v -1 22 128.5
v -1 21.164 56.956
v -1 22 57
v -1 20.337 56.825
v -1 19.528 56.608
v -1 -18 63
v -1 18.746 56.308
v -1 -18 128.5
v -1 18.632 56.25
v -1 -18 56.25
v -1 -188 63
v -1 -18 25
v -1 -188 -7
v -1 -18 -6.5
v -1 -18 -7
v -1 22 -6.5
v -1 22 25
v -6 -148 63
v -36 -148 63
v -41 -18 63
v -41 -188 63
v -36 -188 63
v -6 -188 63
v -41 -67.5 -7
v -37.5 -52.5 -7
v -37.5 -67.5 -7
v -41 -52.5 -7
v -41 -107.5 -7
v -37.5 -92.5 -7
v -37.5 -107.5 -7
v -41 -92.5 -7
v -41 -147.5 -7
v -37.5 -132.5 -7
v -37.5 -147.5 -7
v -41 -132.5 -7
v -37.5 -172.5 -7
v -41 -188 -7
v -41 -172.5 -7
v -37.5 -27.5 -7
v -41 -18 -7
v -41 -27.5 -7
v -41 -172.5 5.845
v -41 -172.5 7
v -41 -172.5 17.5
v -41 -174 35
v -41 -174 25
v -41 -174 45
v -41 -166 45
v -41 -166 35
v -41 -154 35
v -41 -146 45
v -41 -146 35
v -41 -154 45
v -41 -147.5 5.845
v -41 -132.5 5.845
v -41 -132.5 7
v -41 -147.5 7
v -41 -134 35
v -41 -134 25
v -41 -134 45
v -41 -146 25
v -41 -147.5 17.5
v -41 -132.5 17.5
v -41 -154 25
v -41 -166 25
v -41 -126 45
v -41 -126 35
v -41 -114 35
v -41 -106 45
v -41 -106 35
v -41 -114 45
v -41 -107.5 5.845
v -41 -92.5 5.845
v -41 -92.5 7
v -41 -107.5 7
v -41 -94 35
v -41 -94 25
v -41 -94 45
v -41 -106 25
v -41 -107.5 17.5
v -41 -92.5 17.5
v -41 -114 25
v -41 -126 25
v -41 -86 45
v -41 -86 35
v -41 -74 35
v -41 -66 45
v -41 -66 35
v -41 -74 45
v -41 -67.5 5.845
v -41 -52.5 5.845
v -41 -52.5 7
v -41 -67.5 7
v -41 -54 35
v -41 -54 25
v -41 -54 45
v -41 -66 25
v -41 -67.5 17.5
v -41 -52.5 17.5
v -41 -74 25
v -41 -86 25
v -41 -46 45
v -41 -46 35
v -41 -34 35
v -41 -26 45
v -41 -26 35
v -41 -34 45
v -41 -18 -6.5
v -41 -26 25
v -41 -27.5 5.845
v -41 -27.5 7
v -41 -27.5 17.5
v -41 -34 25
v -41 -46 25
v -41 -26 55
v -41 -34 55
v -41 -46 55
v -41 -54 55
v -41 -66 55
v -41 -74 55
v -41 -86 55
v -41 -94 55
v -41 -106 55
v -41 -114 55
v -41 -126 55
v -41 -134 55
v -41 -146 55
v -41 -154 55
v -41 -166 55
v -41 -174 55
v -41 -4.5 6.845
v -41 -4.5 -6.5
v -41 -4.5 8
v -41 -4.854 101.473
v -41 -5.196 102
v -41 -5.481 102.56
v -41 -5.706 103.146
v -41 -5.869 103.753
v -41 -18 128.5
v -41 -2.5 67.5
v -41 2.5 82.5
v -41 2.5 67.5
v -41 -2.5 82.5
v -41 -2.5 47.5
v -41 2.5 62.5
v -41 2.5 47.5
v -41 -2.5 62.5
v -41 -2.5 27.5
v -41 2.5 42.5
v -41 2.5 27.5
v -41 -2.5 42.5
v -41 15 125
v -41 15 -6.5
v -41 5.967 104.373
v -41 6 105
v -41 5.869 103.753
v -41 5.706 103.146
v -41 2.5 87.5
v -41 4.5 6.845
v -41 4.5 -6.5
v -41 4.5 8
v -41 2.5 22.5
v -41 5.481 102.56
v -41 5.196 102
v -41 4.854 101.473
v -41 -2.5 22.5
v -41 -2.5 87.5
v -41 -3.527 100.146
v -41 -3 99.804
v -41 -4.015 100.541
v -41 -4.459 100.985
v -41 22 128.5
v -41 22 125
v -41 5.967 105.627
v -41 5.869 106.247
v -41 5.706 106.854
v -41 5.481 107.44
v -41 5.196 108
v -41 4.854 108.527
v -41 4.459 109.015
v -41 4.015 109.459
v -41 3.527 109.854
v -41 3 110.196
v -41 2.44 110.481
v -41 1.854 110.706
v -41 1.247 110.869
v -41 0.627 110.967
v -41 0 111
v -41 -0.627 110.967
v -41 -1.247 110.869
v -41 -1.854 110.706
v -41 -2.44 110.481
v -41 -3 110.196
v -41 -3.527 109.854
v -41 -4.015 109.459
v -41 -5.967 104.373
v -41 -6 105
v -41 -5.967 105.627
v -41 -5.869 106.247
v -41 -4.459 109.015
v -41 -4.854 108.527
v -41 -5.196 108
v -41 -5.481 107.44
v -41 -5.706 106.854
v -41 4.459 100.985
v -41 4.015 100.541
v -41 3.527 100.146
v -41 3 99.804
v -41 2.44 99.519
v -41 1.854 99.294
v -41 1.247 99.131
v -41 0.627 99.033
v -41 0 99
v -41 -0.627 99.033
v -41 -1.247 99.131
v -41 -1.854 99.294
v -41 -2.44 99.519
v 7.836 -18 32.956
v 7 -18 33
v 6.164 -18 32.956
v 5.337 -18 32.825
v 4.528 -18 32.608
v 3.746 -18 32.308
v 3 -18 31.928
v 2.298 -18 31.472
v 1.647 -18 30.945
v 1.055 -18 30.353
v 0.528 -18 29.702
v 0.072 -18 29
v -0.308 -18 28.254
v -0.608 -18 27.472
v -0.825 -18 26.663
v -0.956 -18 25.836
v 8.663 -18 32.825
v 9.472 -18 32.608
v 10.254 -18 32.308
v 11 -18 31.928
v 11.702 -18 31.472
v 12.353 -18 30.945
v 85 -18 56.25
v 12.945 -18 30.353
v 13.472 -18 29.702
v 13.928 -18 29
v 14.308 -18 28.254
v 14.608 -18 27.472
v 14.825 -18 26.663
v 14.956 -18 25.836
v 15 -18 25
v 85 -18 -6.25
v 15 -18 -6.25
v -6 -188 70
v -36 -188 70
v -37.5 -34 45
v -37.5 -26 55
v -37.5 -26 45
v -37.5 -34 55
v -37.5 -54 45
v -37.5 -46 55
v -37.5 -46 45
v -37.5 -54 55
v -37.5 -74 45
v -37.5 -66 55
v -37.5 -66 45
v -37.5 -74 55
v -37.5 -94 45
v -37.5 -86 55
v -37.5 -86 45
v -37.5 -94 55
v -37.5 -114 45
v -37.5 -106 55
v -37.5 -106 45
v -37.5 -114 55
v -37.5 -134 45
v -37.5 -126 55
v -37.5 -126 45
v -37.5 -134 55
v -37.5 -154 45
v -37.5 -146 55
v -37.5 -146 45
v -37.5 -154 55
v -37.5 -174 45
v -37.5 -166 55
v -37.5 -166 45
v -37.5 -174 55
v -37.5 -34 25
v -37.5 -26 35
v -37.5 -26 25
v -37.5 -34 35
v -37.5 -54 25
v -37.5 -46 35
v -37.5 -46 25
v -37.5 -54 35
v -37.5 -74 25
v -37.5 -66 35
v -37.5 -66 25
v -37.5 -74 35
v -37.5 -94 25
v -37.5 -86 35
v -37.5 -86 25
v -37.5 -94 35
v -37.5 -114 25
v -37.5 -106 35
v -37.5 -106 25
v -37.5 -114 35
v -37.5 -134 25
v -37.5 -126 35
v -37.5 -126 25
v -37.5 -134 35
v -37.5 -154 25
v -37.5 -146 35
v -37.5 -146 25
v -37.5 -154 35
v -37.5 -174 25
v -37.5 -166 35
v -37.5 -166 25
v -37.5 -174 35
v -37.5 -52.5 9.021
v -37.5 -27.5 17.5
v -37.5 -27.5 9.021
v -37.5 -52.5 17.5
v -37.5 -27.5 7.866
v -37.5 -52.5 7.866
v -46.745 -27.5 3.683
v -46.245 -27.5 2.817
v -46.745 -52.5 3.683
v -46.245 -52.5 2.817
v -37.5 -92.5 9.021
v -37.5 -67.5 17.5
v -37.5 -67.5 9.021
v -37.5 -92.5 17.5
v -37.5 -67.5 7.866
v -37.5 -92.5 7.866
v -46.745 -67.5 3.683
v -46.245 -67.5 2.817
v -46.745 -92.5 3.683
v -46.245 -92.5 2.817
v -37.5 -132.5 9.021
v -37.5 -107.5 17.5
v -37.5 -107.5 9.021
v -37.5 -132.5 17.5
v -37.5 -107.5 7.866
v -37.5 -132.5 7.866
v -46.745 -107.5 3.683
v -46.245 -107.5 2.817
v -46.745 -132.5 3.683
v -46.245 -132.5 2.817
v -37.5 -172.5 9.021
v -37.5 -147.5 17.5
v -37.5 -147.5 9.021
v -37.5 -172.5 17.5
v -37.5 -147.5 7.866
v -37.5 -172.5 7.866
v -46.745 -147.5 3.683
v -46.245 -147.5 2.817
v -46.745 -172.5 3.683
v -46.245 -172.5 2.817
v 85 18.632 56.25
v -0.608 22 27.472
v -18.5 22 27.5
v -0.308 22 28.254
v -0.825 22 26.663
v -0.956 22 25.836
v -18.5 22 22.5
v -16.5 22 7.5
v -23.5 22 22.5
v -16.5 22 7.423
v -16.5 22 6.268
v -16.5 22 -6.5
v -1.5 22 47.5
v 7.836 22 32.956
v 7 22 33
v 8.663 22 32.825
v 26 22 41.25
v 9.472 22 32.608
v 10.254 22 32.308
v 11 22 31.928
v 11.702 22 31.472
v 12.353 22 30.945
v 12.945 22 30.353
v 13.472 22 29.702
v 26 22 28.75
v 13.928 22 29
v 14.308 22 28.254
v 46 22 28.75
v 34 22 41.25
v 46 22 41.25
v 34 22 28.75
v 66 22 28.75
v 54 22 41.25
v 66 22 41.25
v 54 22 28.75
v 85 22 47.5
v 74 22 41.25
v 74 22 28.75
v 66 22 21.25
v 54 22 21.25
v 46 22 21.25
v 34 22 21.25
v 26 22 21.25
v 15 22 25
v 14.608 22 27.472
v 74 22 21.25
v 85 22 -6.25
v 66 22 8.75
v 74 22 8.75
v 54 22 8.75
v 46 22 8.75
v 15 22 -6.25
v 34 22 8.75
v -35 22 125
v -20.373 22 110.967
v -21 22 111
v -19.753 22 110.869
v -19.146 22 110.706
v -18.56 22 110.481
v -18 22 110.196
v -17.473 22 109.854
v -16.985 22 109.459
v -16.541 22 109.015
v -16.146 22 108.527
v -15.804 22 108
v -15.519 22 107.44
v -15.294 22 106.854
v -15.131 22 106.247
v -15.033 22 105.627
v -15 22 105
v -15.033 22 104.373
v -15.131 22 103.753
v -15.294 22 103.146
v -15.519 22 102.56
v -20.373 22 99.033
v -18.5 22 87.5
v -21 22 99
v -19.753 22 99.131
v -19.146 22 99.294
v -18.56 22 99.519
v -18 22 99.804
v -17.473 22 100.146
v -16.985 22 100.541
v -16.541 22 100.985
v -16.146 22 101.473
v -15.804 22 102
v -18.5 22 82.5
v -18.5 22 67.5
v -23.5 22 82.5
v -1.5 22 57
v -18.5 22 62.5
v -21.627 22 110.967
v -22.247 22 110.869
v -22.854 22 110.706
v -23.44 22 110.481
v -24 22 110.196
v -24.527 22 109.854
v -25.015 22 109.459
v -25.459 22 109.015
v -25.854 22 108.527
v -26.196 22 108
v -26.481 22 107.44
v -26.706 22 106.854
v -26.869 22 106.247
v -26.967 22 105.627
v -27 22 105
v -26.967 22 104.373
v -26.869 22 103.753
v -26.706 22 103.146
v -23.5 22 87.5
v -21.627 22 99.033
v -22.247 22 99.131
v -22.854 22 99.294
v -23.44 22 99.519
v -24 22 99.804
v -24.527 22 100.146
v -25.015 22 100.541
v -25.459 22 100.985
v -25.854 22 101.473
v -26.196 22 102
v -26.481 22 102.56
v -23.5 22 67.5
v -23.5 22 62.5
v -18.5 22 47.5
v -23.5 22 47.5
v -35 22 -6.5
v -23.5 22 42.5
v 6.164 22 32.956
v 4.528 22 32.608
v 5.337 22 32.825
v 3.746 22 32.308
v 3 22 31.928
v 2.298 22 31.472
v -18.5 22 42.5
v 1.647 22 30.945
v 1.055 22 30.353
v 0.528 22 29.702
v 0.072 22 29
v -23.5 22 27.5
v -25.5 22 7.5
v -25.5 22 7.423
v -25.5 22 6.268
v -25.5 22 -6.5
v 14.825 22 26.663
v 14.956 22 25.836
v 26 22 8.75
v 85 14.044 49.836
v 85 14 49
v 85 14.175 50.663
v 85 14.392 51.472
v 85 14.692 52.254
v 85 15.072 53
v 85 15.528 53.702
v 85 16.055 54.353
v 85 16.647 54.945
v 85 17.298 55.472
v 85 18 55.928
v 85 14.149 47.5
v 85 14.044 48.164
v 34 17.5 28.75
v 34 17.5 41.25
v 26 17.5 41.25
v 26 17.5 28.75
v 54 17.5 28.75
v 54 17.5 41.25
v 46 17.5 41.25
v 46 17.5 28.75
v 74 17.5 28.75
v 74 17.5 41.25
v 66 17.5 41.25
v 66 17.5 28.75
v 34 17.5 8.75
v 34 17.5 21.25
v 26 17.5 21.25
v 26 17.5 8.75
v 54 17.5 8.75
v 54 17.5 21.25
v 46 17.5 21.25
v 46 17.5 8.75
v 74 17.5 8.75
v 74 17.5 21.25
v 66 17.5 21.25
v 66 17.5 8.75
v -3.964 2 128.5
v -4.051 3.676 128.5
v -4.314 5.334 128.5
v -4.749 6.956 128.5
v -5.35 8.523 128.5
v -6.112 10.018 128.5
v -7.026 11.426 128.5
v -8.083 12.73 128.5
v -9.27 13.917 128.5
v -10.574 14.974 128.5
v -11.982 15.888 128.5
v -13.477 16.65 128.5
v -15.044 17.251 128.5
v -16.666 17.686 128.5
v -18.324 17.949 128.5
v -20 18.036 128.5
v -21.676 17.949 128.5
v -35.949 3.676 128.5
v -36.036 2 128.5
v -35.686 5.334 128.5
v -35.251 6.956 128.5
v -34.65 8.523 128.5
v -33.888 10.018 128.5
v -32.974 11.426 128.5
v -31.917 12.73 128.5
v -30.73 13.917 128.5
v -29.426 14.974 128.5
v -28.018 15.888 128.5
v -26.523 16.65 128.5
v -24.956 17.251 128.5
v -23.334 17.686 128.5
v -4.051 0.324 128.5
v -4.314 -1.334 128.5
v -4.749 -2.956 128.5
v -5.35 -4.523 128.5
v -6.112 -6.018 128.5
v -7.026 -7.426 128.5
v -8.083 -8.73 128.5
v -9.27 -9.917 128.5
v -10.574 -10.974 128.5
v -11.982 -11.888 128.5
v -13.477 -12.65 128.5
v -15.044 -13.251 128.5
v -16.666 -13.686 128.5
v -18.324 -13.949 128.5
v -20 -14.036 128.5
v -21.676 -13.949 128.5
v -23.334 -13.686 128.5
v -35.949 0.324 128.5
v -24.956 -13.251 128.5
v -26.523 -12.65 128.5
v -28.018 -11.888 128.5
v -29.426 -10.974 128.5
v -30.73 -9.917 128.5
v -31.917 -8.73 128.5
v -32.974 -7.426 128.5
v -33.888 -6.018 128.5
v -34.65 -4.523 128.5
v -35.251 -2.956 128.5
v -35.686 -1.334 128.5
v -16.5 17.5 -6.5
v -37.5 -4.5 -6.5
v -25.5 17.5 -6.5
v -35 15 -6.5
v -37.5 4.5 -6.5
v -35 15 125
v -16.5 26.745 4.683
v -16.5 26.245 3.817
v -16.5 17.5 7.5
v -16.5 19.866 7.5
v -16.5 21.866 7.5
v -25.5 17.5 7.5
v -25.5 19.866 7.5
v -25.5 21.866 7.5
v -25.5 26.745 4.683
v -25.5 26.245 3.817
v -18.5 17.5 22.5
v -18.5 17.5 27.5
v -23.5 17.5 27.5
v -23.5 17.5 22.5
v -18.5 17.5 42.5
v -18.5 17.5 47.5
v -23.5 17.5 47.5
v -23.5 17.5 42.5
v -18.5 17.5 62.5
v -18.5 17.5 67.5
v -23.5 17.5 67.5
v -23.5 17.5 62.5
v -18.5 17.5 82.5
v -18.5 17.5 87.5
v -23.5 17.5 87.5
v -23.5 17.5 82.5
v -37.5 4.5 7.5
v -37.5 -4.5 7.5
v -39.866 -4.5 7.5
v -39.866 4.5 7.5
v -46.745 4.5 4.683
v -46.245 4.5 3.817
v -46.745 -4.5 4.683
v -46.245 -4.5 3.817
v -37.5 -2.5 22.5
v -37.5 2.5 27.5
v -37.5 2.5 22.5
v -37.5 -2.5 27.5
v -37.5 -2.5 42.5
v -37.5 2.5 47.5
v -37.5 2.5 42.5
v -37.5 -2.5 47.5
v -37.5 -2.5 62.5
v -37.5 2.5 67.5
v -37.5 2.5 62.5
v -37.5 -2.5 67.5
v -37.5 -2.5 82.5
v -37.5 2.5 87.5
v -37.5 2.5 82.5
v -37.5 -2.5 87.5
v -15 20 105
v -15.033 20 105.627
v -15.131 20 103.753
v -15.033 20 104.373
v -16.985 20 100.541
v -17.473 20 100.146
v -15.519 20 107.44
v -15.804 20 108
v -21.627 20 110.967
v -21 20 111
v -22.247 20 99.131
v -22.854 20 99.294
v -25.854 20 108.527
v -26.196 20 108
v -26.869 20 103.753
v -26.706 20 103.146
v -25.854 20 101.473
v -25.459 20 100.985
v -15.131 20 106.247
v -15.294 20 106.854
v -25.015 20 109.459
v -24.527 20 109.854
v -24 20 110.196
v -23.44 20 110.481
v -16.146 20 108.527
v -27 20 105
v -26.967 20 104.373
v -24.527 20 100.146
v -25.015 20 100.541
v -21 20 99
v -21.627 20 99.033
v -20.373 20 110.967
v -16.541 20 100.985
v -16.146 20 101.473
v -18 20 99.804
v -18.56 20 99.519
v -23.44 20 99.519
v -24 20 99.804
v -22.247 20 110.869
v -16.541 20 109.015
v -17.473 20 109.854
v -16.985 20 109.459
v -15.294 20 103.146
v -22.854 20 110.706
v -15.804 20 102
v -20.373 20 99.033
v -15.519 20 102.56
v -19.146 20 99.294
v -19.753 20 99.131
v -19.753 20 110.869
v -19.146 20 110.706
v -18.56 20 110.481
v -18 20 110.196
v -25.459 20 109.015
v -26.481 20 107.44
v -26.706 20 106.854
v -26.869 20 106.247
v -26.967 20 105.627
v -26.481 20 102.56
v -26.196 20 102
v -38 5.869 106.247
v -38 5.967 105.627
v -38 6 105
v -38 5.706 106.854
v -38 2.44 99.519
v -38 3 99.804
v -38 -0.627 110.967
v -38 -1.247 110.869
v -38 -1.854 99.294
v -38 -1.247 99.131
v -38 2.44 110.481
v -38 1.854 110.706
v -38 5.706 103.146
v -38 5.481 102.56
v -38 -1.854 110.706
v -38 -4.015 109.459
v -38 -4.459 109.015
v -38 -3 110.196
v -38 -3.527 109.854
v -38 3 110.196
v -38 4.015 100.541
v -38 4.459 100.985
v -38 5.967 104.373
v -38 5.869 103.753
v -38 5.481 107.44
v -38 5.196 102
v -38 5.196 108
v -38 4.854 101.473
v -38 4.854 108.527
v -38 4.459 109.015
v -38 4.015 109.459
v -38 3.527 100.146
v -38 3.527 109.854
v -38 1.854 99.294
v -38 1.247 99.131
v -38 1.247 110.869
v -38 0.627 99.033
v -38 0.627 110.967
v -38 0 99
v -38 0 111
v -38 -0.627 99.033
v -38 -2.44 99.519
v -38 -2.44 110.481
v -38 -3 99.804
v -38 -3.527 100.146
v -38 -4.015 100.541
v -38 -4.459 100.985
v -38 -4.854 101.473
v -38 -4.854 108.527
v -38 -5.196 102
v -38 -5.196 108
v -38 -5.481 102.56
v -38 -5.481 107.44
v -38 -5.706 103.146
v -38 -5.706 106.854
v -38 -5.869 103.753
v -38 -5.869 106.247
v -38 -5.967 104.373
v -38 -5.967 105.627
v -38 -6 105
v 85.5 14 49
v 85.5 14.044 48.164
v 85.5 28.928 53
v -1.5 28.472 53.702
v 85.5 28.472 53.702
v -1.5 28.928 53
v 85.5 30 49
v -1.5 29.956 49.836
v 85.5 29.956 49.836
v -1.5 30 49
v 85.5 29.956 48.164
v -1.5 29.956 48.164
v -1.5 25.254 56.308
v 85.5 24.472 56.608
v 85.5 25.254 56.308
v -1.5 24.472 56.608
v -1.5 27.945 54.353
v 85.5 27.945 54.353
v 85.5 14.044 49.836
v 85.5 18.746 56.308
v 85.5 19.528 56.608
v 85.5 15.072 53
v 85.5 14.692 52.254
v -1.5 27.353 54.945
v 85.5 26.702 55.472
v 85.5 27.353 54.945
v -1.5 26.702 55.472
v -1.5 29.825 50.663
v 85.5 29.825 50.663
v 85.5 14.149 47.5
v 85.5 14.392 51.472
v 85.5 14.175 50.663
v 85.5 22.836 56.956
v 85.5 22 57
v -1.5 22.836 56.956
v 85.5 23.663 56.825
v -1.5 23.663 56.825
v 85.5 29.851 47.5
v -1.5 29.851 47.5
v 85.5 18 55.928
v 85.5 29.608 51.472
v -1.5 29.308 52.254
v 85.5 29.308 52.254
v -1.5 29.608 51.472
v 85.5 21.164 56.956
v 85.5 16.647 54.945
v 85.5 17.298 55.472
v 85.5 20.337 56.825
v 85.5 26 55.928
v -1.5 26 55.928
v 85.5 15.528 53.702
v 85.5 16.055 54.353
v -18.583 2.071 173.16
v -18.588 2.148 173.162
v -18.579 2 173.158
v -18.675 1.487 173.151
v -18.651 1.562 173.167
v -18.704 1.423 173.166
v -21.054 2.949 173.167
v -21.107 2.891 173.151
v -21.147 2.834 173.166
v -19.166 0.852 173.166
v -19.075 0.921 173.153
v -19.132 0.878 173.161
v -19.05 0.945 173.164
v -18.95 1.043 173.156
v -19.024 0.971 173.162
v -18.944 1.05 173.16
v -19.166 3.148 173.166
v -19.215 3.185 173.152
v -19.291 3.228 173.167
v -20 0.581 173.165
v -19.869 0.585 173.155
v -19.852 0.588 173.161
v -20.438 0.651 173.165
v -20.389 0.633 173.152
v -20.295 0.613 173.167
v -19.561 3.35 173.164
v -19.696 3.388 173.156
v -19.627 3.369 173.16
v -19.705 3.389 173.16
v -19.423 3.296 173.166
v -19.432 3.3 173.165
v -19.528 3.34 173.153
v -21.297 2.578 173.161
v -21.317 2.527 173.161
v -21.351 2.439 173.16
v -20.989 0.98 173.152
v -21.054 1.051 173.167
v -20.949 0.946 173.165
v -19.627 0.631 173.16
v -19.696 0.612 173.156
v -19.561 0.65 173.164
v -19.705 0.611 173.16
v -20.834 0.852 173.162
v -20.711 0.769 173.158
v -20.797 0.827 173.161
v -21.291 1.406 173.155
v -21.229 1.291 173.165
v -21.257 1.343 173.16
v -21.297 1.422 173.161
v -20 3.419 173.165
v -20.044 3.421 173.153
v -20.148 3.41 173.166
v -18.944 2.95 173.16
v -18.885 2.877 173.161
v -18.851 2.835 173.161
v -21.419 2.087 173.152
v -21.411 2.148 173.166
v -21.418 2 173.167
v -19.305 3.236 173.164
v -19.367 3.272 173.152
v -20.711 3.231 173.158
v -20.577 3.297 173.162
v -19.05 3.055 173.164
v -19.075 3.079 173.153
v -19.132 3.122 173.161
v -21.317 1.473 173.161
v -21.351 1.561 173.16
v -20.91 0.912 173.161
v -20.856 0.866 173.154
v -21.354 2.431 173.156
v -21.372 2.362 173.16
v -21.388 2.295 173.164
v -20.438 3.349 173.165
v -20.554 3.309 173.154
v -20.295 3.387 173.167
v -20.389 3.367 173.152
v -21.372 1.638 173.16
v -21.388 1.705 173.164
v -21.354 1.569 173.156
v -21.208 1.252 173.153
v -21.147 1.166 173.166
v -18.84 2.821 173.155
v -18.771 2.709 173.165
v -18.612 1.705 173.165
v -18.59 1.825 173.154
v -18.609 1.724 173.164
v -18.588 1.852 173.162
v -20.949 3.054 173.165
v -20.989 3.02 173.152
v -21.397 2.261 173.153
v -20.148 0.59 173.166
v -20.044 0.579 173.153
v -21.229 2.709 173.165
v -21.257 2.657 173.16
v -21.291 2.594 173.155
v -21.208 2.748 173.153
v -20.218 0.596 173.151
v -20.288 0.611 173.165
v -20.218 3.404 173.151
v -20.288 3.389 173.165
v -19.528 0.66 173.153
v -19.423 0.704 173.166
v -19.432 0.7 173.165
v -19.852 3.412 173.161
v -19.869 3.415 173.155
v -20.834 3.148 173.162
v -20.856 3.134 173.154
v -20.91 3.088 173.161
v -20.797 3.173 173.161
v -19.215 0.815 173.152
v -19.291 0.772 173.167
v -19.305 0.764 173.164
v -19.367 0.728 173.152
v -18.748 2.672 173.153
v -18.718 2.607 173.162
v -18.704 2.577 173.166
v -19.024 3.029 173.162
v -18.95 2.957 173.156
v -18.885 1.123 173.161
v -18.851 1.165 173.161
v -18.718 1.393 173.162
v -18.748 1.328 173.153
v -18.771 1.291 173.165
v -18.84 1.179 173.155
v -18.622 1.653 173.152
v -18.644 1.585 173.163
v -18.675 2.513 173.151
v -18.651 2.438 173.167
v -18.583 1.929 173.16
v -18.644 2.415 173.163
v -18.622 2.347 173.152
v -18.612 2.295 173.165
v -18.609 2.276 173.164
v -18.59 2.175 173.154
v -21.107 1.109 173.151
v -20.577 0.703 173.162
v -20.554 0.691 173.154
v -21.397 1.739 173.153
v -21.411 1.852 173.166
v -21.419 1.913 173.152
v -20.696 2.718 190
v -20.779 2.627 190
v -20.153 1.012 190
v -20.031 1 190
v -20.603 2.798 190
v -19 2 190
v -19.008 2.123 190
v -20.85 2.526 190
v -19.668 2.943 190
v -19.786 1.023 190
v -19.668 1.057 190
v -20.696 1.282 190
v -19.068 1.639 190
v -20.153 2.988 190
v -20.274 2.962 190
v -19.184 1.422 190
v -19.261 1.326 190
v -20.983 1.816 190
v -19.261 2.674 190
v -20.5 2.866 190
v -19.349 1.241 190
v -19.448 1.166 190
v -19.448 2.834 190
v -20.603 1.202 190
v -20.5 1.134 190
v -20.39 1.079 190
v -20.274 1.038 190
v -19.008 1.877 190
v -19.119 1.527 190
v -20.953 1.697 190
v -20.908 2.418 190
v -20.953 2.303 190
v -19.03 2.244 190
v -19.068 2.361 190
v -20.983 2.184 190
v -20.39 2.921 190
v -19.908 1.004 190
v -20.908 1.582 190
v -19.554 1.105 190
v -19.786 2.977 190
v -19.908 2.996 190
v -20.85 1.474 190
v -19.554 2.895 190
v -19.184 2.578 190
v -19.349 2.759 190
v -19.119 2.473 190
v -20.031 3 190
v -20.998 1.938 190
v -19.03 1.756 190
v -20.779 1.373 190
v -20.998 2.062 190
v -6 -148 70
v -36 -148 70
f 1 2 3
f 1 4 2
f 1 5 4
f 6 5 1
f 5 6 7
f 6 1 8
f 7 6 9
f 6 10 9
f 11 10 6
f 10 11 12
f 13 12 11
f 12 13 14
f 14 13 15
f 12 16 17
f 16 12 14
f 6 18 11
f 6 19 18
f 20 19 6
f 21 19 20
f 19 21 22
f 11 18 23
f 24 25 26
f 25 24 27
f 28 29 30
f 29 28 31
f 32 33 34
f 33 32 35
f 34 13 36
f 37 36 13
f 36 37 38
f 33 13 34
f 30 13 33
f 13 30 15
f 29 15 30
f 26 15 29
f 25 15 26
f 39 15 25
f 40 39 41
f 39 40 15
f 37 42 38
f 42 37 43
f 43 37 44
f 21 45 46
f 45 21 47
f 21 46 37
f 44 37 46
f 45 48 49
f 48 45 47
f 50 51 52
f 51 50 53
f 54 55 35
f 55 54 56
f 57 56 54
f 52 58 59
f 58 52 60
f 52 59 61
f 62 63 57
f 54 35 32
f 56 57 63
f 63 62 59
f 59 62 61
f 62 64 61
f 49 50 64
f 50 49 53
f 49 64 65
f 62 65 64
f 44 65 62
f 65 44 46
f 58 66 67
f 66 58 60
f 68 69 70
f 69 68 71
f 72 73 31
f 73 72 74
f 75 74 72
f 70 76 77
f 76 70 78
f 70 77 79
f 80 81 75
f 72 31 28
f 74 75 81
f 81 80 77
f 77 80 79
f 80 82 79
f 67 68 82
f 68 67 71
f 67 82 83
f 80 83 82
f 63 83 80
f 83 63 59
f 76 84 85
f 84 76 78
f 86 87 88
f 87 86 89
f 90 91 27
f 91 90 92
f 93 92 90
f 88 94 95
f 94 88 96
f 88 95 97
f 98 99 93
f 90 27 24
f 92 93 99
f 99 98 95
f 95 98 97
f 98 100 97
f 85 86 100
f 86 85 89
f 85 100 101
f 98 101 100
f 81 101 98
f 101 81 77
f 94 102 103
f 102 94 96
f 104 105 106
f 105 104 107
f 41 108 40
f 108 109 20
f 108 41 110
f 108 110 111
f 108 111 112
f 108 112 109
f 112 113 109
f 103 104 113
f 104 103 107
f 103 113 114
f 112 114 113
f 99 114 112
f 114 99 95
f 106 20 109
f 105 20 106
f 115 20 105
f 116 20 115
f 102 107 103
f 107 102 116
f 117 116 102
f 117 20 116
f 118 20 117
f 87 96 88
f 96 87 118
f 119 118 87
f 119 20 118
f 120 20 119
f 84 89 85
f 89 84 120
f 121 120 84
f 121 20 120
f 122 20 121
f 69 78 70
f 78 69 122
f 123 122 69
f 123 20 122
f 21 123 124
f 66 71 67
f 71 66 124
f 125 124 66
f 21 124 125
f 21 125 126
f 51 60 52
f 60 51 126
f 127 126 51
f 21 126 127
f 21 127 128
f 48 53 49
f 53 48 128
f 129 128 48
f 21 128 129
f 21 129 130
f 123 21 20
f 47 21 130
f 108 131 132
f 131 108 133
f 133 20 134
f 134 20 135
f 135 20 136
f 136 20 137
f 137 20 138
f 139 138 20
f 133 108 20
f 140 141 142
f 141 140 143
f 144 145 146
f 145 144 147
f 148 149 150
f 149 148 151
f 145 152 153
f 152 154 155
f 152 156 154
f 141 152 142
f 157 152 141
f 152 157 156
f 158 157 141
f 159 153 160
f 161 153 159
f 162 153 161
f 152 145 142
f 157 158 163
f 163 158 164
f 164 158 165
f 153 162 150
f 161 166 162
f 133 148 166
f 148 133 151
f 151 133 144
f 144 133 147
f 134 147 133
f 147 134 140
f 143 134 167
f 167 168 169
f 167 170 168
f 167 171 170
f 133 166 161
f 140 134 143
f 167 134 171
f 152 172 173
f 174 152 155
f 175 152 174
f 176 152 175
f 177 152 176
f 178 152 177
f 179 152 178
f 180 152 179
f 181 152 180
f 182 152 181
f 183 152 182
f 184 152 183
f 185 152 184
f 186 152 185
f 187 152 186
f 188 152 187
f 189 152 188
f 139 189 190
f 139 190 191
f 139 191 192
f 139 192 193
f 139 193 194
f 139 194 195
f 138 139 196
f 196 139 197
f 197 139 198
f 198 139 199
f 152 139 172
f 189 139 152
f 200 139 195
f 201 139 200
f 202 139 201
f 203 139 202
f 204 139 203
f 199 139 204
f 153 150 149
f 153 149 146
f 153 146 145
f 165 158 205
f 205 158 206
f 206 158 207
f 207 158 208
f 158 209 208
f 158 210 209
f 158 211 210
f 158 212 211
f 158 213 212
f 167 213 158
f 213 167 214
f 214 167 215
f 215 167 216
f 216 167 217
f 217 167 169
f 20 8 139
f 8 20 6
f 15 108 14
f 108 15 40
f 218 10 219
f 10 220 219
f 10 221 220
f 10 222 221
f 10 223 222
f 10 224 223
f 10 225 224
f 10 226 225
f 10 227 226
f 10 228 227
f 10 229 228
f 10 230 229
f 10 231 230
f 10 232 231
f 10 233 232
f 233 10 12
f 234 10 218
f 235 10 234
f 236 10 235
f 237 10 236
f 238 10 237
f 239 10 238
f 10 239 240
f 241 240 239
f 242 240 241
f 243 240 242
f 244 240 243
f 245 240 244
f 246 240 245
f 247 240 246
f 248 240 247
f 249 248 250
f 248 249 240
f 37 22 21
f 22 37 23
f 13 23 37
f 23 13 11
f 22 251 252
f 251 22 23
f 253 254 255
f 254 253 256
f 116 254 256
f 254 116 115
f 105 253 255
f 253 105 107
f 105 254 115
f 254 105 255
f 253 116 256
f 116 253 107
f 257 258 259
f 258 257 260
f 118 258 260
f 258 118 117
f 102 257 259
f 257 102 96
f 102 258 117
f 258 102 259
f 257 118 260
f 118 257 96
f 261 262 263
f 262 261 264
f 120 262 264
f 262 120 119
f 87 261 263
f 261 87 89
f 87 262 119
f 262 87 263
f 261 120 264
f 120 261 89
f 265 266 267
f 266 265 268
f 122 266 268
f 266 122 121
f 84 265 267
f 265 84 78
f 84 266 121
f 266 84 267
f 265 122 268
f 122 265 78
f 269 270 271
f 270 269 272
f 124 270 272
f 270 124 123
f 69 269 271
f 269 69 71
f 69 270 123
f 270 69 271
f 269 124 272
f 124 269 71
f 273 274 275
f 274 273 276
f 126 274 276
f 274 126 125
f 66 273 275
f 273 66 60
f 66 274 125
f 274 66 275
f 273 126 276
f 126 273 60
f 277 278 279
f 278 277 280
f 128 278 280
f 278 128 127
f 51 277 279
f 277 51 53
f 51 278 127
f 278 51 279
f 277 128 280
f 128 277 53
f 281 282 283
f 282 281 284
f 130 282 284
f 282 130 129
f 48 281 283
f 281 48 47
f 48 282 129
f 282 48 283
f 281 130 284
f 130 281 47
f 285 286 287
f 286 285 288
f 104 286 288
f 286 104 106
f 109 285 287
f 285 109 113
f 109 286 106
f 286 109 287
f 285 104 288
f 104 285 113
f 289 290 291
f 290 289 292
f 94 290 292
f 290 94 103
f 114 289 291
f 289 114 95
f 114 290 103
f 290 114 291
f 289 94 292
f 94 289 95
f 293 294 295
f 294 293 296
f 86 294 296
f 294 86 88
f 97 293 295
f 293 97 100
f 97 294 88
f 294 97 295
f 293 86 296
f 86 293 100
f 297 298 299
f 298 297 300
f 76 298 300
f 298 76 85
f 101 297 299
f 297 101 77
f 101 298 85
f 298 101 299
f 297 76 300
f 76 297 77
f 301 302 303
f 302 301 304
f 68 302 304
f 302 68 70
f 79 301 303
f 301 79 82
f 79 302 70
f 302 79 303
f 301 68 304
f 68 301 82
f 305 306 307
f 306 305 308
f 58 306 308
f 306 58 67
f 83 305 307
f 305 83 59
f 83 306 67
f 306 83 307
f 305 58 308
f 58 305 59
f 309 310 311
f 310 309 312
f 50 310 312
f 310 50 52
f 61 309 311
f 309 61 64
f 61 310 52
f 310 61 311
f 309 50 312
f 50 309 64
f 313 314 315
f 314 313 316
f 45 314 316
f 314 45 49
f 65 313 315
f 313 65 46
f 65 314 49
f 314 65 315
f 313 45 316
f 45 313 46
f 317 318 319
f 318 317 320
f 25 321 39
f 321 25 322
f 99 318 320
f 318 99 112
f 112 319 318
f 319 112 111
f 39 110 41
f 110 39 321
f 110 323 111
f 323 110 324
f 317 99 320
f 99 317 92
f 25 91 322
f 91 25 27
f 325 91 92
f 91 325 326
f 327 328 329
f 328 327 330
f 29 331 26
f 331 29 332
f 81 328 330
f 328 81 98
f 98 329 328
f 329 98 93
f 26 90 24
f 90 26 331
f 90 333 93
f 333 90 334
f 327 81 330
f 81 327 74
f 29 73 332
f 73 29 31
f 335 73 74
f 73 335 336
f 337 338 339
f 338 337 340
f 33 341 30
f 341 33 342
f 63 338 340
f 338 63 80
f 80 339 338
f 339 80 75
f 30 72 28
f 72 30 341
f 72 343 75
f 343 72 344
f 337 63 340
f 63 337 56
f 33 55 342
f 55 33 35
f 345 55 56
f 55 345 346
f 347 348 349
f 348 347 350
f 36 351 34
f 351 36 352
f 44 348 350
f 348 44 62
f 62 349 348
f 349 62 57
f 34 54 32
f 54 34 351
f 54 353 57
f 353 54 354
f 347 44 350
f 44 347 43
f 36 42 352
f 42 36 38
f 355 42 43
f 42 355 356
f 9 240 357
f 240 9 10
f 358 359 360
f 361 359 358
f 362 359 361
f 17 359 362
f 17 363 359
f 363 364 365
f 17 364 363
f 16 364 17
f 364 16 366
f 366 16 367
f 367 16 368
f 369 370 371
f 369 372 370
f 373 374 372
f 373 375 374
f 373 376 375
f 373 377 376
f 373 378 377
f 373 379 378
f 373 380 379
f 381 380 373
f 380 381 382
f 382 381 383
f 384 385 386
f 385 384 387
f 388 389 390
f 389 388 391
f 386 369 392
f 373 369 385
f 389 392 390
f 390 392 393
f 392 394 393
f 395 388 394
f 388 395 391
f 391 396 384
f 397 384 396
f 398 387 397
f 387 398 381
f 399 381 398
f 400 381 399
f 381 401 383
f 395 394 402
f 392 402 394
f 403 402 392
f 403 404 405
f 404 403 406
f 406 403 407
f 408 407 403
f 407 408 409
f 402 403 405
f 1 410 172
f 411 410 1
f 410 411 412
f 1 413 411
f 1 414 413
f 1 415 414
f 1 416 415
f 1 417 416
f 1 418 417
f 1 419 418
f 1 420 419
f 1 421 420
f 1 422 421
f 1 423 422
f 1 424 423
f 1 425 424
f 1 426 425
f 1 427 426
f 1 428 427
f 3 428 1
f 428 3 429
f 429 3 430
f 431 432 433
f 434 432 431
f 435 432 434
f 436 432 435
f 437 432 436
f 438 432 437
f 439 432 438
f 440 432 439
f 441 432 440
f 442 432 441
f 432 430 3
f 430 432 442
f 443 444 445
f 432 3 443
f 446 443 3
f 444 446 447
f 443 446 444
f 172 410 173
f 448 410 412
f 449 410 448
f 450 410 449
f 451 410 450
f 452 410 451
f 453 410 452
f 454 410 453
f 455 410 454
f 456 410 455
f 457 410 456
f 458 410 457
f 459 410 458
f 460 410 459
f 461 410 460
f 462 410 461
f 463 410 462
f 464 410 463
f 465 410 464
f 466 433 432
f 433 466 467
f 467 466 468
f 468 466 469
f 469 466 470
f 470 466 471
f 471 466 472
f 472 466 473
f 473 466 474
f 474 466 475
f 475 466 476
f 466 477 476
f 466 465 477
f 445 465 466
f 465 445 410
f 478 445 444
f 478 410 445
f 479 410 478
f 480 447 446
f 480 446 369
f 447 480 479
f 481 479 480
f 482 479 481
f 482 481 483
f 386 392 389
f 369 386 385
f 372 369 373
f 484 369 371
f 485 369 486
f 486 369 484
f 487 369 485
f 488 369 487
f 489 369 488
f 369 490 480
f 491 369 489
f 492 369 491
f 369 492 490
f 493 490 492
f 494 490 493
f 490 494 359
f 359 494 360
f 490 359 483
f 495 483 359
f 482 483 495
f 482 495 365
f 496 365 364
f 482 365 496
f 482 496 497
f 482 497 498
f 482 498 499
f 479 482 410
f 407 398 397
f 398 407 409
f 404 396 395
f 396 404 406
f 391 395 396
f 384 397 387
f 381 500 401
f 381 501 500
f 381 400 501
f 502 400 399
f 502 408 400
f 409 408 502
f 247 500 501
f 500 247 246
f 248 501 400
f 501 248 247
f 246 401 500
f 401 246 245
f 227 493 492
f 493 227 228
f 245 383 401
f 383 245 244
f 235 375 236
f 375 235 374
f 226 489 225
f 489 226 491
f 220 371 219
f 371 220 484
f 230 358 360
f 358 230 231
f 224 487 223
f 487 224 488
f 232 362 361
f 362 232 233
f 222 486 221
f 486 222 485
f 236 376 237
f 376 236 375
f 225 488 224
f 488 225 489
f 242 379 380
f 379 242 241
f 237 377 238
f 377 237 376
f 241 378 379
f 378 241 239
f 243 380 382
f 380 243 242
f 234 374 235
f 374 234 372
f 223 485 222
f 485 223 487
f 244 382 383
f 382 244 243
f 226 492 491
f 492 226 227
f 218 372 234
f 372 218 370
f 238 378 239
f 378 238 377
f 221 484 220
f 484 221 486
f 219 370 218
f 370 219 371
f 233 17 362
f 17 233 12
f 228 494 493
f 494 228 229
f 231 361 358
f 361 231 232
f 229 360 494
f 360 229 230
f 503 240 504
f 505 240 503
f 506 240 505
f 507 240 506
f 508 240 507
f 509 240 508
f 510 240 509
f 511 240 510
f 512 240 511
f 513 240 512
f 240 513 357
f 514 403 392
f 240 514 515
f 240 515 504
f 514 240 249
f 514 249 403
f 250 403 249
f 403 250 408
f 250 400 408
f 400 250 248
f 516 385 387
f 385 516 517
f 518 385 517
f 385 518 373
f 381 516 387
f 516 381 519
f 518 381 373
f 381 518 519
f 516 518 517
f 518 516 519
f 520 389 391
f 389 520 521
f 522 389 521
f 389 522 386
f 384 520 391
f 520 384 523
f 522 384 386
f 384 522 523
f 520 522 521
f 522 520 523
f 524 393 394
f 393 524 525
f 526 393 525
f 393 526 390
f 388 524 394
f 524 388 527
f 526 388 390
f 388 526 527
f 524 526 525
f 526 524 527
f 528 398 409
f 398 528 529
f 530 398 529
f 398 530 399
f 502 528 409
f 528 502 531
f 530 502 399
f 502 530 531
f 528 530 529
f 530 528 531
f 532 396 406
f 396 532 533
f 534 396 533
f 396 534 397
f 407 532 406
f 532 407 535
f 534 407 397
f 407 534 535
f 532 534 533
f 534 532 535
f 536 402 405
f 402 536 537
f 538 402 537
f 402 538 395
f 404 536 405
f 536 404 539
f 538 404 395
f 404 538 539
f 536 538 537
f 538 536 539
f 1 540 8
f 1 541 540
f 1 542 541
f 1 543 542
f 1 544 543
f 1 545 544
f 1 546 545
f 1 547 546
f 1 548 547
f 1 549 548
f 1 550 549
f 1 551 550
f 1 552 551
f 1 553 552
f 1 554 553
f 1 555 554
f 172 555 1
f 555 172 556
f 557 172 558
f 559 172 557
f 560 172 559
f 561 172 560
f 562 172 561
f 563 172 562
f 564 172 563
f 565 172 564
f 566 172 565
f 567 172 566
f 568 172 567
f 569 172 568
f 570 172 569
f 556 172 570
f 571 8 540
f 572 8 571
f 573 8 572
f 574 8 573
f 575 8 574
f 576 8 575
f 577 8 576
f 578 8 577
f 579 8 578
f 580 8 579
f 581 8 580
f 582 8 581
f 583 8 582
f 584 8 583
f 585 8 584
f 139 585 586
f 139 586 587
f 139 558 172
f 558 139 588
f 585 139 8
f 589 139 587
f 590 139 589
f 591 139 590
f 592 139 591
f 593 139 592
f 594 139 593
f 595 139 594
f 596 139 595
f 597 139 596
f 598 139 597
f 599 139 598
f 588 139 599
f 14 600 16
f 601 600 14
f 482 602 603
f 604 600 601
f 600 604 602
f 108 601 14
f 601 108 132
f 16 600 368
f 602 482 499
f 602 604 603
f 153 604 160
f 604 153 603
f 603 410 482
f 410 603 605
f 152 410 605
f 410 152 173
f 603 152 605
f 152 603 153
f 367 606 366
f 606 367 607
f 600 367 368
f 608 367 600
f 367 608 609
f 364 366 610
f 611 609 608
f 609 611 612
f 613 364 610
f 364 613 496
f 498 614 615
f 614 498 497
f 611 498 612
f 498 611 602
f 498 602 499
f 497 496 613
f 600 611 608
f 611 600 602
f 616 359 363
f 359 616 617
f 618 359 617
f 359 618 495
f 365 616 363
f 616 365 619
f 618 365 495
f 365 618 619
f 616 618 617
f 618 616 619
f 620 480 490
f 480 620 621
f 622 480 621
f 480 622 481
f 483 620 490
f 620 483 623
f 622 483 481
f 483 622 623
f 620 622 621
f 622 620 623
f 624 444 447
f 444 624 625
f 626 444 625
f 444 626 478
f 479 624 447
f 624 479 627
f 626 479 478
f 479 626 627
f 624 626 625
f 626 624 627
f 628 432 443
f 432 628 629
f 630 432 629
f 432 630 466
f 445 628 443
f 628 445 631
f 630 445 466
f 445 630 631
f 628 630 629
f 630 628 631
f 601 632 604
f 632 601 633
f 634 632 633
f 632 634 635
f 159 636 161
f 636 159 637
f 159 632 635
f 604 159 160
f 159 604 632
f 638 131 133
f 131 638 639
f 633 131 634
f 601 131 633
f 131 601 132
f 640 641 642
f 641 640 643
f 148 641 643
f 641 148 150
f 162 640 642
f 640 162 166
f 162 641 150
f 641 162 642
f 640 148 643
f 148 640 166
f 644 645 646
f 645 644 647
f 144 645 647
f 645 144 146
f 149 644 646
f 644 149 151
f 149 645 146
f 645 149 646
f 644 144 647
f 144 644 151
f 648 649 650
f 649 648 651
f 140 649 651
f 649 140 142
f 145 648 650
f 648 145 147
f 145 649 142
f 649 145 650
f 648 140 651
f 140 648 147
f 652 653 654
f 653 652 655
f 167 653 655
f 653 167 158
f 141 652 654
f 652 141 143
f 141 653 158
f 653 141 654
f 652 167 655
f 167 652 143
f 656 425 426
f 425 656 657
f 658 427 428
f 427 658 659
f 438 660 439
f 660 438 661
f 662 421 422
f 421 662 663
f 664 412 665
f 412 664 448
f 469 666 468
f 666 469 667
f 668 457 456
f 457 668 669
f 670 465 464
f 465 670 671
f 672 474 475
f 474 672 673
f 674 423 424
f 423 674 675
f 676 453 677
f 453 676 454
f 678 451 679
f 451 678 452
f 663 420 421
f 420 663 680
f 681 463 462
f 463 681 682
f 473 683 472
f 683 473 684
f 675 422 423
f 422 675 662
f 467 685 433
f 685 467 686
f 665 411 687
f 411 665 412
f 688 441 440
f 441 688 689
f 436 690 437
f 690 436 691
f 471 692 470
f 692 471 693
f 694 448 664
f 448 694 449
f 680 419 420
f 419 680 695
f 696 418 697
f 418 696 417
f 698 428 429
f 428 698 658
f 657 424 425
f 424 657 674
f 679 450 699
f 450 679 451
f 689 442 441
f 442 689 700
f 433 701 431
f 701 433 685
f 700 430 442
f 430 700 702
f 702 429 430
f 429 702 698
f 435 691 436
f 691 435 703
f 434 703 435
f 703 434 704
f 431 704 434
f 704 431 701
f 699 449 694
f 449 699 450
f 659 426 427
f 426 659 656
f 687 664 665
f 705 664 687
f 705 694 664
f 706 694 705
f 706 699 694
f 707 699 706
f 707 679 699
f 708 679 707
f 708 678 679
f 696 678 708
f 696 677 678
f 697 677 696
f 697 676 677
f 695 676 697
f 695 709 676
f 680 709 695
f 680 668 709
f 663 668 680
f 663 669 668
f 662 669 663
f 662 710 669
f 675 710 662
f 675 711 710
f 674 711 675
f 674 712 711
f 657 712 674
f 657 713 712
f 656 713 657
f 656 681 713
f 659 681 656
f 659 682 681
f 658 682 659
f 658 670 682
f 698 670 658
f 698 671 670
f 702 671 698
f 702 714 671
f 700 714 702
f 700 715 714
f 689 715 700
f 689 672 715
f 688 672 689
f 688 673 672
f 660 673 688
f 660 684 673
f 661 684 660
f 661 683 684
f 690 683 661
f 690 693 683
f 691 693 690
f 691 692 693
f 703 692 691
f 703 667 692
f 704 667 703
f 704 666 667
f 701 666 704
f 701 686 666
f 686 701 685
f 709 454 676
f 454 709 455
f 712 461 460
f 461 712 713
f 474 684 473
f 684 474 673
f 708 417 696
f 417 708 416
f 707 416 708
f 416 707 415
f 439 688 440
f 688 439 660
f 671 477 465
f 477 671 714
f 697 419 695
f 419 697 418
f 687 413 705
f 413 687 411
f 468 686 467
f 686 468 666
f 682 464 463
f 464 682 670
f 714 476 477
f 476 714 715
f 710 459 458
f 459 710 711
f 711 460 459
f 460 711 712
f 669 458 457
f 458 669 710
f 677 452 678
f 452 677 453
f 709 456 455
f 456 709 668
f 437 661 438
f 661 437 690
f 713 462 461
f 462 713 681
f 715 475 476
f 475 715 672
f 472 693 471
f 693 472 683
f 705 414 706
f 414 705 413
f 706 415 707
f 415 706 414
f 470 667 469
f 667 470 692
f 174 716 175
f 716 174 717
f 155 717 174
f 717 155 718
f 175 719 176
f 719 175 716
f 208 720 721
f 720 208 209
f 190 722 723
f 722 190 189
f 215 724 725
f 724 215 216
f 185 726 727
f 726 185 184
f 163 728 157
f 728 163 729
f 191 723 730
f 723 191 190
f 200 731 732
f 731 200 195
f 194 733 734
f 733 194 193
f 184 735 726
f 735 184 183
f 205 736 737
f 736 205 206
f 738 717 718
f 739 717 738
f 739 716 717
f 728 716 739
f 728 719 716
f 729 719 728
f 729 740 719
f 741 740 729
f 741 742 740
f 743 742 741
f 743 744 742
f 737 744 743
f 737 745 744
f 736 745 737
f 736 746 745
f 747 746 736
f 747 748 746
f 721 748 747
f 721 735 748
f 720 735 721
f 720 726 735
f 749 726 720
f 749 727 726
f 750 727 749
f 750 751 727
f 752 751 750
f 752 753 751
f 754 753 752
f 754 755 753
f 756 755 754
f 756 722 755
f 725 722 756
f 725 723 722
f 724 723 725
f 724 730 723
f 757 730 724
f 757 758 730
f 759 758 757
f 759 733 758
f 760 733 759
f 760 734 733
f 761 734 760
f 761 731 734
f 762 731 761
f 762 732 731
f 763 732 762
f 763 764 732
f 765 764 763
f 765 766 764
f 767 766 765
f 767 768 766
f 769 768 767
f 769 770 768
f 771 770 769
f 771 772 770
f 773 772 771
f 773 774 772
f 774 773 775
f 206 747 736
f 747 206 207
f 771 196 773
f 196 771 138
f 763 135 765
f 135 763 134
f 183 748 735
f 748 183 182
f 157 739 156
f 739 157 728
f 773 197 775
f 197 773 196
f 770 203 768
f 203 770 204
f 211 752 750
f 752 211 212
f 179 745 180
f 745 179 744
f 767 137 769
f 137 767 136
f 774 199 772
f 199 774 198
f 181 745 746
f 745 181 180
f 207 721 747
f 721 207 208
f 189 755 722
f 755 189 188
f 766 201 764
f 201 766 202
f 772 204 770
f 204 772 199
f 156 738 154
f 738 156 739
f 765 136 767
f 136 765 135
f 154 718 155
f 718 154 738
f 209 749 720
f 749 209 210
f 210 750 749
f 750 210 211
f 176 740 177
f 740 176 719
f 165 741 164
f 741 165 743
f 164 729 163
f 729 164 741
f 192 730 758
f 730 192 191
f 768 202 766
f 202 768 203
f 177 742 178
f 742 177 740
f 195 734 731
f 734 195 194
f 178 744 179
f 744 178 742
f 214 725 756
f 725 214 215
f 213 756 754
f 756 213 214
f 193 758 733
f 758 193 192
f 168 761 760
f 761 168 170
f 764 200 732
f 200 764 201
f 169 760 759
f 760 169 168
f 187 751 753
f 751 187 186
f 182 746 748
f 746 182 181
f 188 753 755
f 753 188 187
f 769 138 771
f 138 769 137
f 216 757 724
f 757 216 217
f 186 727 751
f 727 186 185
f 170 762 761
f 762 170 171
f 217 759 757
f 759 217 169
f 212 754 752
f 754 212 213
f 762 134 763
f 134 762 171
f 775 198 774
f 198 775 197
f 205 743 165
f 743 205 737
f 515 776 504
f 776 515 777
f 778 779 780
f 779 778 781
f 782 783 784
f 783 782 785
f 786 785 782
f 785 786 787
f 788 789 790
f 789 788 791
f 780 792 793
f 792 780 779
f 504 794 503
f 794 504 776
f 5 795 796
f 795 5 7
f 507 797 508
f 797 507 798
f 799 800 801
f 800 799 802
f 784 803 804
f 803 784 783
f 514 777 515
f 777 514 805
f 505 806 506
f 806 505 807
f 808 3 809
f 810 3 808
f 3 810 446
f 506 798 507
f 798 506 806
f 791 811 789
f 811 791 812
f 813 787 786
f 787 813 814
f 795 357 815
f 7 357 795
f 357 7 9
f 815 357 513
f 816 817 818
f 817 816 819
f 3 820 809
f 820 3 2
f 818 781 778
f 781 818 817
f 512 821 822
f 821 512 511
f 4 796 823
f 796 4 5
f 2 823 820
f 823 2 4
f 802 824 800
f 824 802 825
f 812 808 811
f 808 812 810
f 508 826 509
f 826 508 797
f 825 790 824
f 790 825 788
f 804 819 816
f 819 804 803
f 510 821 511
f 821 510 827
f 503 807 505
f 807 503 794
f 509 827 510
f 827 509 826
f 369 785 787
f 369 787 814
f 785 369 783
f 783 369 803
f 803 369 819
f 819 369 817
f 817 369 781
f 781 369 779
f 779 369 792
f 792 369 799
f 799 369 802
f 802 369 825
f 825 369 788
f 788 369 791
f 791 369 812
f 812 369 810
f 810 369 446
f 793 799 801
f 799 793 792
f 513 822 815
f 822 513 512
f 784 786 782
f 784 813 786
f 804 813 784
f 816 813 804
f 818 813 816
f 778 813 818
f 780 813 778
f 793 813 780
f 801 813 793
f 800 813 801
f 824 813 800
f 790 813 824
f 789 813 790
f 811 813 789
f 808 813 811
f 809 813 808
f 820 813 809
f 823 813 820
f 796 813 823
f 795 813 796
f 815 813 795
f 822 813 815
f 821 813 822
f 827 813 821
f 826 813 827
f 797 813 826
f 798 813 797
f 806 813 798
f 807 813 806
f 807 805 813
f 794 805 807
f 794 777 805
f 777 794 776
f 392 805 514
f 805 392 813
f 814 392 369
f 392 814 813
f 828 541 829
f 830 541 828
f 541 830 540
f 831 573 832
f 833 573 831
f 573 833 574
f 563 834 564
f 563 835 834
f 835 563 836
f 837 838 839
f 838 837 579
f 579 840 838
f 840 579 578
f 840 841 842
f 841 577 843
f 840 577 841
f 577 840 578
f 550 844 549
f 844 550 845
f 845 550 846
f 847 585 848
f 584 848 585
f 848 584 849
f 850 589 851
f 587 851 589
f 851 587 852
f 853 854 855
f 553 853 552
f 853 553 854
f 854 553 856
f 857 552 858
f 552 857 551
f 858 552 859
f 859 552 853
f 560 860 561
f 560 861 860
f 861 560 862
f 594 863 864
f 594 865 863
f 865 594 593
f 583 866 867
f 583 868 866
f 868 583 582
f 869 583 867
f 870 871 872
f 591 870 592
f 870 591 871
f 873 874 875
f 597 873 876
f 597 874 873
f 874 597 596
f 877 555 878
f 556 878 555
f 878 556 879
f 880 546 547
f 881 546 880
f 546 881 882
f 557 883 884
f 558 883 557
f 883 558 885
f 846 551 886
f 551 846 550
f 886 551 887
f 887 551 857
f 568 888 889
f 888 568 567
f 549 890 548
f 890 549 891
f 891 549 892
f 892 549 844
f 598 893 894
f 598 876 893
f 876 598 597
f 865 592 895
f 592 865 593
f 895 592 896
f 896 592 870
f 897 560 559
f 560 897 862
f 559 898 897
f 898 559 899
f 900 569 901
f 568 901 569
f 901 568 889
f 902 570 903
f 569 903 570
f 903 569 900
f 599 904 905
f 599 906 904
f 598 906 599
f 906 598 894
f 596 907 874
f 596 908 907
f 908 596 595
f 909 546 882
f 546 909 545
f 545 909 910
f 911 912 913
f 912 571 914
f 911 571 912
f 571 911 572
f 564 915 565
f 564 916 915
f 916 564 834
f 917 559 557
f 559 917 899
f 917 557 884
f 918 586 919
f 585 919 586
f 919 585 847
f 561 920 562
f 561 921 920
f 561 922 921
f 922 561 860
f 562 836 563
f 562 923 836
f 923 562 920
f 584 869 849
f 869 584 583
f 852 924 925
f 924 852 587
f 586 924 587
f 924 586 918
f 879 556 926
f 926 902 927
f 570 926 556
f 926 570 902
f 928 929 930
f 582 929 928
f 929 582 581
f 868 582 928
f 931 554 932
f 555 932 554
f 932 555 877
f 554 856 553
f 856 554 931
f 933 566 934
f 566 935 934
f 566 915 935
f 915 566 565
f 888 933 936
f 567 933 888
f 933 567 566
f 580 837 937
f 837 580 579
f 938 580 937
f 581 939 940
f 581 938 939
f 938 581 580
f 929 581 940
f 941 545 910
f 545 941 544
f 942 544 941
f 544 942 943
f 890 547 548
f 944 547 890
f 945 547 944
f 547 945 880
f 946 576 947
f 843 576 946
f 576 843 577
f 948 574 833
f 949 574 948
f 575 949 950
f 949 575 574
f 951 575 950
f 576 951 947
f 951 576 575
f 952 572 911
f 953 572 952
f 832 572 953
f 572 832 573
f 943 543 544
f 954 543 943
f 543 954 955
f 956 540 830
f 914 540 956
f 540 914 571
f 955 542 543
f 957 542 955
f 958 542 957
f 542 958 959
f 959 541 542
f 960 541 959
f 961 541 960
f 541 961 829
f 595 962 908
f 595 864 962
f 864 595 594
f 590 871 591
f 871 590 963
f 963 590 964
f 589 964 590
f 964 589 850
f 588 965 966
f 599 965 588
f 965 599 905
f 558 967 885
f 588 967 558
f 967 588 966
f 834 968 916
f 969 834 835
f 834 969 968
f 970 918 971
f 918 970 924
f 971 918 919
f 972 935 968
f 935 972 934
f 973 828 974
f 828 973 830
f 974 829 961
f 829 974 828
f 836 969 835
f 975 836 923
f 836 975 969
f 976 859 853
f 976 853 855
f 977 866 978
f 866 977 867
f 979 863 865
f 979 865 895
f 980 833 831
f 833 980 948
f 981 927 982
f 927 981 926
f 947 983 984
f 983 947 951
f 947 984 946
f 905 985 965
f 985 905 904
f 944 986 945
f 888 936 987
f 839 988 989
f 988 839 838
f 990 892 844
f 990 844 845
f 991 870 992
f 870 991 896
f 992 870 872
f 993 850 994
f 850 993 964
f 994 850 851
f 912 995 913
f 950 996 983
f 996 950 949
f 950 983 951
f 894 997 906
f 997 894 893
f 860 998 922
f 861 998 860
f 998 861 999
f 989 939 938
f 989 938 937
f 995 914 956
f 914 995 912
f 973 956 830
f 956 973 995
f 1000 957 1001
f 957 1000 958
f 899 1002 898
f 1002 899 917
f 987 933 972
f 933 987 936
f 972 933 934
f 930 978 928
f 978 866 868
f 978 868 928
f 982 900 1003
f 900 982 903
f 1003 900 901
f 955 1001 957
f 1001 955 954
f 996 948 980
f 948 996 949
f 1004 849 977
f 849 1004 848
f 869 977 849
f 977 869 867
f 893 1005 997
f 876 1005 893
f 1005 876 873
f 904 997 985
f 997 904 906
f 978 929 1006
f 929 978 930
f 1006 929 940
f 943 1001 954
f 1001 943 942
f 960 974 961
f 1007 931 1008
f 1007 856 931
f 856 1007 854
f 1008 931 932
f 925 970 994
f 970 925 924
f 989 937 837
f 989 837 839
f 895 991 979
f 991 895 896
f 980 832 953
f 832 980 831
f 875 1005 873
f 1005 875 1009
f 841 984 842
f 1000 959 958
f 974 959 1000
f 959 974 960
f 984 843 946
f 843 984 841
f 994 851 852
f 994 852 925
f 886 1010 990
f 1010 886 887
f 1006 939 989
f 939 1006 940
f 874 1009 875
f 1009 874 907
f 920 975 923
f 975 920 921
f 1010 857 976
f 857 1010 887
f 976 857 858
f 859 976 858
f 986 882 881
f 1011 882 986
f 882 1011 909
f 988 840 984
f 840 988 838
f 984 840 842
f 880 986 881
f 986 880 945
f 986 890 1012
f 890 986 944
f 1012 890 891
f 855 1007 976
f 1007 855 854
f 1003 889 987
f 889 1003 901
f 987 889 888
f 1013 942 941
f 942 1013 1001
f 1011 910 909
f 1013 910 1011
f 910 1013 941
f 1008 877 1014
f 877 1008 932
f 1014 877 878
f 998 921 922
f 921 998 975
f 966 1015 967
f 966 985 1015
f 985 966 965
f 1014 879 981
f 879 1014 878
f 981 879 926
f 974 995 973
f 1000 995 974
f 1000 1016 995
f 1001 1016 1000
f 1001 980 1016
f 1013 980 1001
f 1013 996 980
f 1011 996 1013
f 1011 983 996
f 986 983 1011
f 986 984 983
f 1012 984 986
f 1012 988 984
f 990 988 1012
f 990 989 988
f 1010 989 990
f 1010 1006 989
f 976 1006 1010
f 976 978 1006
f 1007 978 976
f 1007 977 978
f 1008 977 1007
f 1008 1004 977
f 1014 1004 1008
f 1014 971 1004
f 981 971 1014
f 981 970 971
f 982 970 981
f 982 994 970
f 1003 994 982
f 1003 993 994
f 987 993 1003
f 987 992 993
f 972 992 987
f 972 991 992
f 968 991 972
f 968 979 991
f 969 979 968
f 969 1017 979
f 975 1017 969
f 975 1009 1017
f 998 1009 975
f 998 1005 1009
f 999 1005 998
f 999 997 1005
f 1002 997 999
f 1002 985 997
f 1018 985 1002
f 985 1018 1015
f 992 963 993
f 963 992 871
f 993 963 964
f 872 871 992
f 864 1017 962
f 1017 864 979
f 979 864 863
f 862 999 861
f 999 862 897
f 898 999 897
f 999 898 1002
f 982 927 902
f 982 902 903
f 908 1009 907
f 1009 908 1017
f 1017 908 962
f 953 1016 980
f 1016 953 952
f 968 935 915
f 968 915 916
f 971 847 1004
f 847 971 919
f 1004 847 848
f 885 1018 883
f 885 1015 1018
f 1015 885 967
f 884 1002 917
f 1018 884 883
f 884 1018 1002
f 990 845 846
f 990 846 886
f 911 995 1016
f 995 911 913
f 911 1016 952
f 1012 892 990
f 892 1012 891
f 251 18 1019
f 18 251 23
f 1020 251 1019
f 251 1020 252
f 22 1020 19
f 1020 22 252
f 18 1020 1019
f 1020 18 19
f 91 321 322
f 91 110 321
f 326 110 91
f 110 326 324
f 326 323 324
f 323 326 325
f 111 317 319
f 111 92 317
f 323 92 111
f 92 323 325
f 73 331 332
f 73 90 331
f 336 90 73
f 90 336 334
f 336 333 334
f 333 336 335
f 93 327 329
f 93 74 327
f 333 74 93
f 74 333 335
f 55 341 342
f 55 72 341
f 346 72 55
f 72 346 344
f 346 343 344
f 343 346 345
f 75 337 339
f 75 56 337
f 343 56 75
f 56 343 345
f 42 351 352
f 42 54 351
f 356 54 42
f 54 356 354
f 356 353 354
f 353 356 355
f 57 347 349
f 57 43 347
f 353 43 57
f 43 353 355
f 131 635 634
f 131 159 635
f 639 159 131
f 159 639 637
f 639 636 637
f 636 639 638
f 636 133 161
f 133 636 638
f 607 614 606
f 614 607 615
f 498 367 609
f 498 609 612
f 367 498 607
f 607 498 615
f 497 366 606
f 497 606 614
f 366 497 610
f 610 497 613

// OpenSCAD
$fs=0.25;$fa=6;
union() {
translate([-20,2,150])cylinder(h=55, r1=18, r2=0, center=true);
translate([-20,2,170])cylinder(h=40, r1=2, r2=1, center=true);
translate([-21,-168,35])cube([30,40,70],center=true);
difference(){translate([-21,-103,28])cube([40,170,70],center=true);
translate([-40,-30,50])cube([5,8,10],center=true);
translate([-40,-50,50])cube([5,8,10],center=true);
translate([-40,-70,50])cube([5,8,10],center=true);
translate([-40,-90,50])cube([5,8,10],center=true);
translate([-40,-110,50])cube([5,8,10],center=true);
translate([-40,-130,50])cube([5,8,10],center=true);
translate([-40,-150,50])cube([5,8,10],center=true);
translate([-40,-170,50])cube([5,8,10],center=true);
translate([-40,-30,30])cube([5,8,10],center=true);
translate([-40,-50,30])cube([5,8,10],center=true);
translate([-40,-70,30])cube([5,8,10],center=true);
translate([-40,-90,30])cube([5,8,10],center=true);
translate([-40,-110,30])cube([5,8,10],center=true);
translate([-40,-130,30])cube([5,8,10],center=true);
translate([-40,-150,30])cube([5,8,10],center=true);
translate([-40,-170,30])cube([5,8,10],center=true);
translate([-40,-40,5])cube([5,25,25],center=true);
translate([-40,-80,5])cube([5,25,25],center=true);
translate([-40,-120,5])cube([5,25,25],center=true);
translate([-40,-160,5])cube([5,25,25],center=true);
}difference(){translate([7,2,25])cube([17,40,62.5],center=true);
translate([7,2,0])cube([94.1176,40,50],center=true);
translate([7,22,25])rotate([90,0,0])cylinder(h=80, r=8, center=true);
}difference(){translate([50,2,25])cube([70,40,62.5],center=true);
translate([30,20,35])cube([8,5,12.5],center=true);
translate([50,20,35])cube([8,5,12.5],center=true);
translate([70,20,35])cube([8,5,12.5],center=true);
translate([30,20,15])cube([8,5,12.5],center=true);
translate([50,20,15])cube([8,5,12.5],center=true);
translate([70,20,15])cube([8,5,12.5],center=true);
}difference(){translate([-21,2,61])cube([40,40,135],center=true);
translate([-40,20,59])cube([10,10,132],center=true);
translate([-21,20,0])cube([9,5,15],center=true);
translate([-21,20,25])cube([5,5,5],center=true);
translate([-21,20,45])cube([5,5,5],center=true);
translate([-21,20,65])cube([5,5,5],center=true);
translate([-21,20,85])cube([5,5,5],center=true);
translate([-40,0,0])cube([5,9,15],center=true);
translate([-40,0,25])cube([5,5,5],center=true);
translate([-40,0,45])cube([5,5,5],center=true);
translate([-40,0,65])cube([5,5,5],center=true);
translate([-40,0,85])cube([5,5,5],center=true);
translate([-21,22,105])rotate([90,0,0])cylinder(h=4, r=6, center=true);
translate([-40,0,105])rotate([90,0,90])cylinder(h=4, r=6, center=true);
}translate([-40,-40,7])rotate([0,60,0])cube([1,25,15],center=true);
translate([-40,-80,7])rotate([0,60,0])cube([1,25,15],center=true);
translate([-40,-120,7])rotate([0,60,0])cube([1,25,15],center=true);
translate([-40,-160,7])rotate([0,60,0])cube([1,25,15],center=true);
difference(){translate([42,22,49])rotate([90,30,90])cylinder(h=87, r=8, center=true);
translate([42,20,35])cube([87,20,25],center=true);
}translate([-40,0,8])rotate([0,60,0])cube([1,9,15],center=true);
translate([-21,20,8])rotate([60,0,0])cube([9,1,15],center=true);
}
